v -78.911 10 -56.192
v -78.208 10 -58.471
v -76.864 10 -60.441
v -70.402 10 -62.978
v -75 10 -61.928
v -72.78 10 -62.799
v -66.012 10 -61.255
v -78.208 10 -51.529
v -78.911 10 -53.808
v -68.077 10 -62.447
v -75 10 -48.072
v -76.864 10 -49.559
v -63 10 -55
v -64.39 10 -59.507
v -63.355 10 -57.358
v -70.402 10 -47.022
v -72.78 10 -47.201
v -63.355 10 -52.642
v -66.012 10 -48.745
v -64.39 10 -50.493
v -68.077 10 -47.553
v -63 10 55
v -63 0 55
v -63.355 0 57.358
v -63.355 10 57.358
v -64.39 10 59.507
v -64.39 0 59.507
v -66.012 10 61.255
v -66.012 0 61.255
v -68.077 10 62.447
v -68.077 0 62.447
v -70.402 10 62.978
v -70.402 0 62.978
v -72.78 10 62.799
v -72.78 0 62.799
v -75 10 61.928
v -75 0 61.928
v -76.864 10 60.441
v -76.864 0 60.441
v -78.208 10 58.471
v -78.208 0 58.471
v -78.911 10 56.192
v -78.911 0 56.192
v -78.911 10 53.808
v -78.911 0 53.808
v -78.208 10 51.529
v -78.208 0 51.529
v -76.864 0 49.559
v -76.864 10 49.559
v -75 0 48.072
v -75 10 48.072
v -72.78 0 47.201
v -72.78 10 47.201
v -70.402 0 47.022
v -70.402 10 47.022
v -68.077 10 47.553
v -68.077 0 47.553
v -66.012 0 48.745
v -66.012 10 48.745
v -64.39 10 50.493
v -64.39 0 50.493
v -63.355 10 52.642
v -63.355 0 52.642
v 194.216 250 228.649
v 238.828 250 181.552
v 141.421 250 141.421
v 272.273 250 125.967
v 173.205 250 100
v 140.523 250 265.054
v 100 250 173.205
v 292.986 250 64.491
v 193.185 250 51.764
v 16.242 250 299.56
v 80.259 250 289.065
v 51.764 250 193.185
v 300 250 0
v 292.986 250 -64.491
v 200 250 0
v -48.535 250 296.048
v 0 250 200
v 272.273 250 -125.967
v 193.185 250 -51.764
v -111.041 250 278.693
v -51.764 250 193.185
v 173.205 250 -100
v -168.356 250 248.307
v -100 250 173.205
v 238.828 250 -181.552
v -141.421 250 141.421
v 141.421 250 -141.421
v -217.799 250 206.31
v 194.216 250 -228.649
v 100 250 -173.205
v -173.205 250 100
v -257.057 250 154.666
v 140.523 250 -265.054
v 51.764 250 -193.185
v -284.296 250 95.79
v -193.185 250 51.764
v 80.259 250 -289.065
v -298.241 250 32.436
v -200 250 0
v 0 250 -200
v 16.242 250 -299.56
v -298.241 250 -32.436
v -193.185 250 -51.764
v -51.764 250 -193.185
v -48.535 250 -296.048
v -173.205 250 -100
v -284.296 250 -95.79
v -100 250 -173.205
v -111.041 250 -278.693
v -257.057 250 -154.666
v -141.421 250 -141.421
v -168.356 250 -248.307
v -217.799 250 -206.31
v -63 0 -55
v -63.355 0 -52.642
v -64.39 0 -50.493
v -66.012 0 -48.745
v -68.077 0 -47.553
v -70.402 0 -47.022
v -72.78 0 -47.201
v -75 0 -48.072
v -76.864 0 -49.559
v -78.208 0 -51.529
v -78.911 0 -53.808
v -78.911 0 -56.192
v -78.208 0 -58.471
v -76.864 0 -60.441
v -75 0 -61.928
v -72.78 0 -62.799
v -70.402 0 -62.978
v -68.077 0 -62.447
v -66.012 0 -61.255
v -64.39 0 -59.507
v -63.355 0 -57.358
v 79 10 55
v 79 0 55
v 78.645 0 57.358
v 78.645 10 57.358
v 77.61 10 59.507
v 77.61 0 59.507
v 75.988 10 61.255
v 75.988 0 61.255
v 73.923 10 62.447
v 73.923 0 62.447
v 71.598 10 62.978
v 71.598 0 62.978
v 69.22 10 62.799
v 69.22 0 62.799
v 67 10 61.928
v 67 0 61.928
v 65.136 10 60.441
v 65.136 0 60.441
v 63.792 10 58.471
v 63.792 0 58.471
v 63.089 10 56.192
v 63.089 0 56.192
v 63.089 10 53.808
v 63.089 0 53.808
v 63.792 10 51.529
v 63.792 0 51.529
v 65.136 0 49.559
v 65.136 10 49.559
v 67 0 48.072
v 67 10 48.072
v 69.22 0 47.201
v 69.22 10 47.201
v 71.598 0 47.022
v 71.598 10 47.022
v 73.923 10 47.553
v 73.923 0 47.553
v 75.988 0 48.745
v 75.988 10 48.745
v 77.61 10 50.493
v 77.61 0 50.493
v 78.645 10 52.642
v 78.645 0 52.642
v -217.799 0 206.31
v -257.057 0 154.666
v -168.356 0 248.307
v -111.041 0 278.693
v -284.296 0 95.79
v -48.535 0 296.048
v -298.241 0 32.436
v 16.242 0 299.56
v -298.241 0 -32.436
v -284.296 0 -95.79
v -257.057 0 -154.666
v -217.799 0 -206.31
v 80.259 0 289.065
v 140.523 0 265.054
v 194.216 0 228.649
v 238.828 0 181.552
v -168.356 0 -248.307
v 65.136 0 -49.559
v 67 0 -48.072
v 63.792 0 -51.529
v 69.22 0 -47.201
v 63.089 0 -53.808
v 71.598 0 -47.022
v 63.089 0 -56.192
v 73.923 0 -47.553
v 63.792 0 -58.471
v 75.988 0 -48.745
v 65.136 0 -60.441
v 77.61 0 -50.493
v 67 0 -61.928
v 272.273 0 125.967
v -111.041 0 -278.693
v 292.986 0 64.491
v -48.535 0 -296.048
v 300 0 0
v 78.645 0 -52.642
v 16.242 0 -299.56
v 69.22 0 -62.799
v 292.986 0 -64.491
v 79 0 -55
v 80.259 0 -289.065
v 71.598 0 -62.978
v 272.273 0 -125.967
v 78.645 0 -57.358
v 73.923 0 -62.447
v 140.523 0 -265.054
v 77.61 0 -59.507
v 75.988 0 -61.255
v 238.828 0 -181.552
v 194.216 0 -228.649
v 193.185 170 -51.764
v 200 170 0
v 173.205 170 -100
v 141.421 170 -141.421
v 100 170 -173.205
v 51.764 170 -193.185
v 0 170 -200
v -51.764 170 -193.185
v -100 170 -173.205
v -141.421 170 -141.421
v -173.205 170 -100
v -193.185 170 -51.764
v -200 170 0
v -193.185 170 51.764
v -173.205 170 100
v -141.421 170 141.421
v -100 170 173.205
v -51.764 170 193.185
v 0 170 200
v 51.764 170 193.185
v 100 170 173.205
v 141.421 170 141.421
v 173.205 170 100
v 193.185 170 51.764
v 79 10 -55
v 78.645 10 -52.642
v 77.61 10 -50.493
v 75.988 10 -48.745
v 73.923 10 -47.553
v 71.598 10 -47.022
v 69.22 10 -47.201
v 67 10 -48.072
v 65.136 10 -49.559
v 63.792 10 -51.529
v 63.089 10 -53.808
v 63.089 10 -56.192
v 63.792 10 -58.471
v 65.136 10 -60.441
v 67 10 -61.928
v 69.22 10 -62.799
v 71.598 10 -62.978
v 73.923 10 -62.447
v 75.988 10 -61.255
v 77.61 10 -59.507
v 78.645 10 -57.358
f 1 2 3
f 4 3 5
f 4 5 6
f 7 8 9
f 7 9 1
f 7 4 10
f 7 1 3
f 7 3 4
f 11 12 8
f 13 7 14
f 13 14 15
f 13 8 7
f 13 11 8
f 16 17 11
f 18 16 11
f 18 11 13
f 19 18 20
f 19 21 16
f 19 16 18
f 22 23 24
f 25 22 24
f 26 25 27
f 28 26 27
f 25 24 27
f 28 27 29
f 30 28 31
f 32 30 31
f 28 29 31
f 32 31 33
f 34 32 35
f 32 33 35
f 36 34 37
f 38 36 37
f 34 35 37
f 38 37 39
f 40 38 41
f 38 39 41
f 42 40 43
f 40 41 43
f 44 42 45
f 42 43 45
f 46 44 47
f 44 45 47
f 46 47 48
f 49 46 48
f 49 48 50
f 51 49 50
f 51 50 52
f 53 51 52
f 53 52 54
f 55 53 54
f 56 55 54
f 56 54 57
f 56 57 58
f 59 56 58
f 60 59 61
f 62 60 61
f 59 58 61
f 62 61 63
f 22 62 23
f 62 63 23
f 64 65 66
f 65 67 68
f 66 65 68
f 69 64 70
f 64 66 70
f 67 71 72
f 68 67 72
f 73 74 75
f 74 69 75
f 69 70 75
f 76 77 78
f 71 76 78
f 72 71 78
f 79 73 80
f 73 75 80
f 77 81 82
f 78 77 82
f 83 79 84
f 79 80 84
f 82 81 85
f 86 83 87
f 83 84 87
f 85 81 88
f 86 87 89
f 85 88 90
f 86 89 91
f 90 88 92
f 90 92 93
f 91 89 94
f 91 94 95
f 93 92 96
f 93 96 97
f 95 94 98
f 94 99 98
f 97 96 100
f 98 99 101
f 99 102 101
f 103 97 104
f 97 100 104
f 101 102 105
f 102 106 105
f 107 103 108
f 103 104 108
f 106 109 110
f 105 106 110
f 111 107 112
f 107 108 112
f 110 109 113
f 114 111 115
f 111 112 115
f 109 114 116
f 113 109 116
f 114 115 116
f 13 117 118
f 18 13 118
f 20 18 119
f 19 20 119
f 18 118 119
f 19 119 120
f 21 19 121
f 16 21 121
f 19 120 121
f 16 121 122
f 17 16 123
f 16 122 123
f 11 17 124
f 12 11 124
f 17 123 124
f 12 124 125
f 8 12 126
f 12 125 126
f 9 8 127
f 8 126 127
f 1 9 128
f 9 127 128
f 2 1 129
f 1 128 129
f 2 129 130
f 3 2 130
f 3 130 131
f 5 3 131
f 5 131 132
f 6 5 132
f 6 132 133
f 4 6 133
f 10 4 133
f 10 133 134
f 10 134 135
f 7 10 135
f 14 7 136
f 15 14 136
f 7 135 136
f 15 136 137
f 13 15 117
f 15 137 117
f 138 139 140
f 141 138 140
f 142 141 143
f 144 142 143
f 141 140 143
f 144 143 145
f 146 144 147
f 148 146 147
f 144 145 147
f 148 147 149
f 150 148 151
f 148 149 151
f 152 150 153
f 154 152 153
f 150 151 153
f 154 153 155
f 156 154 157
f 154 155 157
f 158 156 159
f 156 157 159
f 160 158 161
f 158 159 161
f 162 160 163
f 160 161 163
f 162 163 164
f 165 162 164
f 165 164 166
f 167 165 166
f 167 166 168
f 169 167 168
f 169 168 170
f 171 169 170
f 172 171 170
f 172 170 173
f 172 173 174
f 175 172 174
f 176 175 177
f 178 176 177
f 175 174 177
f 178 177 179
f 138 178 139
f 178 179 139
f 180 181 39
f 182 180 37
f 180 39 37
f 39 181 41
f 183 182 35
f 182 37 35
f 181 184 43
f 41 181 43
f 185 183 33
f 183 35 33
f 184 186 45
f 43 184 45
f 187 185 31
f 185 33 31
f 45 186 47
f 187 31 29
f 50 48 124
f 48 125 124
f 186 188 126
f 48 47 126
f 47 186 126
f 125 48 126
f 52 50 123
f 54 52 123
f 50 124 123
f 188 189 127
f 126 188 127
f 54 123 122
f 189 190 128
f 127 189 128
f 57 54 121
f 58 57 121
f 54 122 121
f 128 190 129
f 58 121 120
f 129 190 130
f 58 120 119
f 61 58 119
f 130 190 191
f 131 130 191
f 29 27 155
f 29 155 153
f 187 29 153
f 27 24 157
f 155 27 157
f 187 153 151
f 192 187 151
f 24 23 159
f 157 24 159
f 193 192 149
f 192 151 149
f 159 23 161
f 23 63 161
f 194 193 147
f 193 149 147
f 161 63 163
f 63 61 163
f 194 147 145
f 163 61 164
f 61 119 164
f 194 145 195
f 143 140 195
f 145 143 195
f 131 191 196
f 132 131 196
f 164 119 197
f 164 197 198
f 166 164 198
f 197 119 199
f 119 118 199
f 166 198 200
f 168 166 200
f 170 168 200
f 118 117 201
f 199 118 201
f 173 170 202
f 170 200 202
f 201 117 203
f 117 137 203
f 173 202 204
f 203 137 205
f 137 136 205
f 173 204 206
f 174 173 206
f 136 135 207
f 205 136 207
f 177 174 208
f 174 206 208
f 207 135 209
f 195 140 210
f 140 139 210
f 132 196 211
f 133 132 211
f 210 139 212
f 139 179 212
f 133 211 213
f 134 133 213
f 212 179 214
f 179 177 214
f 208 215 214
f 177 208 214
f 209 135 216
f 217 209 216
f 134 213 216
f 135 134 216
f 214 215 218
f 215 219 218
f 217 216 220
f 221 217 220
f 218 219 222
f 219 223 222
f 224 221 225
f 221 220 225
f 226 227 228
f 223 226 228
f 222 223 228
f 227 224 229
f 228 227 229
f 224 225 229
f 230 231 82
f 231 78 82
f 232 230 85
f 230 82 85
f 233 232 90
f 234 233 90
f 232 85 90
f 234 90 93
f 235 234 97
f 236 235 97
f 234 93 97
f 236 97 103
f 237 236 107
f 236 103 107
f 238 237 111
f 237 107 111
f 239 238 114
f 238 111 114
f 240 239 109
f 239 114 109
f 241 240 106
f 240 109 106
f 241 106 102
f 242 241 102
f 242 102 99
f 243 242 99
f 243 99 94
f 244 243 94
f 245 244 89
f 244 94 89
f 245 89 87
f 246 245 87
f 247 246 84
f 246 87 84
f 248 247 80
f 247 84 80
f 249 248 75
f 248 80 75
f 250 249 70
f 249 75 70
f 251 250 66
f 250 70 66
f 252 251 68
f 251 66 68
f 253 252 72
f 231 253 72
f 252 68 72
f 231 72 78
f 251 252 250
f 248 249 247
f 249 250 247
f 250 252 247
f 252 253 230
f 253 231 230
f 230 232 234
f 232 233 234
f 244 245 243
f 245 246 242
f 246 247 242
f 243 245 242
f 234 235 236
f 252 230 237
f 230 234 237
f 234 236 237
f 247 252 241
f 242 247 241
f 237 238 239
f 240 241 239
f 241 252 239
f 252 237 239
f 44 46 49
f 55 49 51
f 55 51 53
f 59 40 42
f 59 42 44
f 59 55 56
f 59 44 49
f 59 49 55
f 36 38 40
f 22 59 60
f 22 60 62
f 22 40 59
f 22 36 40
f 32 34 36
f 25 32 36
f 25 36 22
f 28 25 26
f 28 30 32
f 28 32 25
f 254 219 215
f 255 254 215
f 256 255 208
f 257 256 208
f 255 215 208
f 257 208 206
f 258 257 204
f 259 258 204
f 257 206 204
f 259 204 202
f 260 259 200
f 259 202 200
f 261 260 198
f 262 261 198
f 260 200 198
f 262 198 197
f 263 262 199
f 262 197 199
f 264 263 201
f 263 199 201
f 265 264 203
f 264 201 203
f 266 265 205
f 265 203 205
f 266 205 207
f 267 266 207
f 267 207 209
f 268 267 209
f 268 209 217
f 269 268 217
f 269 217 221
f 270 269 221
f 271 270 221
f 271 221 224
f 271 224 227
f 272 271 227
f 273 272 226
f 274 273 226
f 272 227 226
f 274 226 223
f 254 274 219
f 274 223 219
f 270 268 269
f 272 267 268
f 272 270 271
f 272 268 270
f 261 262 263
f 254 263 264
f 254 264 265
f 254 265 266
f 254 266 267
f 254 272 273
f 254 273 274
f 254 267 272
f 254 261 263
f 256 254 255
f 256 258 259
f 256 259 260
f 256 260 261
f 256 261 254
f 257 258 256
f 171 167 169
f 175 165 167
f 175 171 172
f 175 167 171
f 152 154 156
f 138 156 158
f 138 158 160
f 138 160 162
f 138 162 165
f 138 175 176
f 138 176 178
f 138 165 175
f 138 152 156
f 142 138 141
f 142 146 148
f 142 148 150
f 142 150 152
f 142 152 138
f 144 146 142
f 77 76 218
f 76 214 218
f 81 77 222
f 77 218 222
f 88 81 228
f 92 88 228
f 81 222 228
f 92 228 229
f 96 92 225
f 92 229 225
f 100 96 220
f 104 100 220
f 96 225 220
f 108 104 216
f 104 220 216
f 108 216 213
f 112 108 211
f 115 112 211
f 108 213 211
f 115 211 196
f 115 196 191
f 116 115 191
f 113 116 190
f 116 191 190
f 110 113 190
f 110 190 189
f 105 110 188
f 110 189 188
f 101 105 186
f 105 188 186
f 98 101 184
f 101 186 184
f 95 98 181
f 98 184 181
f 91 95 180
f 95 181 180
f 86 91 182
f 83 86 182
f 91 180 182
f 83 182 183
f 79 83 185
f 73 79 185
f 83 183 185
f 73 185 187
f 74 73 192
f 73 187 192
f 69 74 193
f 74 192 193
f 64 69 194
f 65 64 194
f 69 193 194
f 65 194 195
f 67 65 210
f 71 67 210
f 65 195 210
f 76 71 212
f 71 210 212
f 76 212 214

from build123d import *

# Parameters (mm, degrees)
ESBO_O3_R             = 8
CORTE_EXTRUS_O2_DEPTH = 10


with BuildPart() as part:
    # Esboço1 → Revolução1 (revolve)
    with BuildSketch(Plane.XY):
        Polygon((200, 250), (300, 250), (300, 0), (0, 0), (0, 170), (200, 170), align=None)
    revolve(axis=Axis((0, 0, 0), (0, 1, 0)))

    # Esboço3 → Corte-extrusão2 (cut)
    with BuildSketch(Plane.XZ):
        with Locations((-71, 55)):
            Circle(ESBO_O3_R)
        with Locations((71, 55)):
            Circle(ESBO_O3_R)
        with Locations((71, -55)):
            Circle(ESBO_O3_R)
        with Locations((-71, -55)):
            Circle(ESBO_O3_R)
    extrude(amount=-CORTE_EXTRUS_O2_DEPTH, mode=Mode.SUBTRACT)


solid = part.part
